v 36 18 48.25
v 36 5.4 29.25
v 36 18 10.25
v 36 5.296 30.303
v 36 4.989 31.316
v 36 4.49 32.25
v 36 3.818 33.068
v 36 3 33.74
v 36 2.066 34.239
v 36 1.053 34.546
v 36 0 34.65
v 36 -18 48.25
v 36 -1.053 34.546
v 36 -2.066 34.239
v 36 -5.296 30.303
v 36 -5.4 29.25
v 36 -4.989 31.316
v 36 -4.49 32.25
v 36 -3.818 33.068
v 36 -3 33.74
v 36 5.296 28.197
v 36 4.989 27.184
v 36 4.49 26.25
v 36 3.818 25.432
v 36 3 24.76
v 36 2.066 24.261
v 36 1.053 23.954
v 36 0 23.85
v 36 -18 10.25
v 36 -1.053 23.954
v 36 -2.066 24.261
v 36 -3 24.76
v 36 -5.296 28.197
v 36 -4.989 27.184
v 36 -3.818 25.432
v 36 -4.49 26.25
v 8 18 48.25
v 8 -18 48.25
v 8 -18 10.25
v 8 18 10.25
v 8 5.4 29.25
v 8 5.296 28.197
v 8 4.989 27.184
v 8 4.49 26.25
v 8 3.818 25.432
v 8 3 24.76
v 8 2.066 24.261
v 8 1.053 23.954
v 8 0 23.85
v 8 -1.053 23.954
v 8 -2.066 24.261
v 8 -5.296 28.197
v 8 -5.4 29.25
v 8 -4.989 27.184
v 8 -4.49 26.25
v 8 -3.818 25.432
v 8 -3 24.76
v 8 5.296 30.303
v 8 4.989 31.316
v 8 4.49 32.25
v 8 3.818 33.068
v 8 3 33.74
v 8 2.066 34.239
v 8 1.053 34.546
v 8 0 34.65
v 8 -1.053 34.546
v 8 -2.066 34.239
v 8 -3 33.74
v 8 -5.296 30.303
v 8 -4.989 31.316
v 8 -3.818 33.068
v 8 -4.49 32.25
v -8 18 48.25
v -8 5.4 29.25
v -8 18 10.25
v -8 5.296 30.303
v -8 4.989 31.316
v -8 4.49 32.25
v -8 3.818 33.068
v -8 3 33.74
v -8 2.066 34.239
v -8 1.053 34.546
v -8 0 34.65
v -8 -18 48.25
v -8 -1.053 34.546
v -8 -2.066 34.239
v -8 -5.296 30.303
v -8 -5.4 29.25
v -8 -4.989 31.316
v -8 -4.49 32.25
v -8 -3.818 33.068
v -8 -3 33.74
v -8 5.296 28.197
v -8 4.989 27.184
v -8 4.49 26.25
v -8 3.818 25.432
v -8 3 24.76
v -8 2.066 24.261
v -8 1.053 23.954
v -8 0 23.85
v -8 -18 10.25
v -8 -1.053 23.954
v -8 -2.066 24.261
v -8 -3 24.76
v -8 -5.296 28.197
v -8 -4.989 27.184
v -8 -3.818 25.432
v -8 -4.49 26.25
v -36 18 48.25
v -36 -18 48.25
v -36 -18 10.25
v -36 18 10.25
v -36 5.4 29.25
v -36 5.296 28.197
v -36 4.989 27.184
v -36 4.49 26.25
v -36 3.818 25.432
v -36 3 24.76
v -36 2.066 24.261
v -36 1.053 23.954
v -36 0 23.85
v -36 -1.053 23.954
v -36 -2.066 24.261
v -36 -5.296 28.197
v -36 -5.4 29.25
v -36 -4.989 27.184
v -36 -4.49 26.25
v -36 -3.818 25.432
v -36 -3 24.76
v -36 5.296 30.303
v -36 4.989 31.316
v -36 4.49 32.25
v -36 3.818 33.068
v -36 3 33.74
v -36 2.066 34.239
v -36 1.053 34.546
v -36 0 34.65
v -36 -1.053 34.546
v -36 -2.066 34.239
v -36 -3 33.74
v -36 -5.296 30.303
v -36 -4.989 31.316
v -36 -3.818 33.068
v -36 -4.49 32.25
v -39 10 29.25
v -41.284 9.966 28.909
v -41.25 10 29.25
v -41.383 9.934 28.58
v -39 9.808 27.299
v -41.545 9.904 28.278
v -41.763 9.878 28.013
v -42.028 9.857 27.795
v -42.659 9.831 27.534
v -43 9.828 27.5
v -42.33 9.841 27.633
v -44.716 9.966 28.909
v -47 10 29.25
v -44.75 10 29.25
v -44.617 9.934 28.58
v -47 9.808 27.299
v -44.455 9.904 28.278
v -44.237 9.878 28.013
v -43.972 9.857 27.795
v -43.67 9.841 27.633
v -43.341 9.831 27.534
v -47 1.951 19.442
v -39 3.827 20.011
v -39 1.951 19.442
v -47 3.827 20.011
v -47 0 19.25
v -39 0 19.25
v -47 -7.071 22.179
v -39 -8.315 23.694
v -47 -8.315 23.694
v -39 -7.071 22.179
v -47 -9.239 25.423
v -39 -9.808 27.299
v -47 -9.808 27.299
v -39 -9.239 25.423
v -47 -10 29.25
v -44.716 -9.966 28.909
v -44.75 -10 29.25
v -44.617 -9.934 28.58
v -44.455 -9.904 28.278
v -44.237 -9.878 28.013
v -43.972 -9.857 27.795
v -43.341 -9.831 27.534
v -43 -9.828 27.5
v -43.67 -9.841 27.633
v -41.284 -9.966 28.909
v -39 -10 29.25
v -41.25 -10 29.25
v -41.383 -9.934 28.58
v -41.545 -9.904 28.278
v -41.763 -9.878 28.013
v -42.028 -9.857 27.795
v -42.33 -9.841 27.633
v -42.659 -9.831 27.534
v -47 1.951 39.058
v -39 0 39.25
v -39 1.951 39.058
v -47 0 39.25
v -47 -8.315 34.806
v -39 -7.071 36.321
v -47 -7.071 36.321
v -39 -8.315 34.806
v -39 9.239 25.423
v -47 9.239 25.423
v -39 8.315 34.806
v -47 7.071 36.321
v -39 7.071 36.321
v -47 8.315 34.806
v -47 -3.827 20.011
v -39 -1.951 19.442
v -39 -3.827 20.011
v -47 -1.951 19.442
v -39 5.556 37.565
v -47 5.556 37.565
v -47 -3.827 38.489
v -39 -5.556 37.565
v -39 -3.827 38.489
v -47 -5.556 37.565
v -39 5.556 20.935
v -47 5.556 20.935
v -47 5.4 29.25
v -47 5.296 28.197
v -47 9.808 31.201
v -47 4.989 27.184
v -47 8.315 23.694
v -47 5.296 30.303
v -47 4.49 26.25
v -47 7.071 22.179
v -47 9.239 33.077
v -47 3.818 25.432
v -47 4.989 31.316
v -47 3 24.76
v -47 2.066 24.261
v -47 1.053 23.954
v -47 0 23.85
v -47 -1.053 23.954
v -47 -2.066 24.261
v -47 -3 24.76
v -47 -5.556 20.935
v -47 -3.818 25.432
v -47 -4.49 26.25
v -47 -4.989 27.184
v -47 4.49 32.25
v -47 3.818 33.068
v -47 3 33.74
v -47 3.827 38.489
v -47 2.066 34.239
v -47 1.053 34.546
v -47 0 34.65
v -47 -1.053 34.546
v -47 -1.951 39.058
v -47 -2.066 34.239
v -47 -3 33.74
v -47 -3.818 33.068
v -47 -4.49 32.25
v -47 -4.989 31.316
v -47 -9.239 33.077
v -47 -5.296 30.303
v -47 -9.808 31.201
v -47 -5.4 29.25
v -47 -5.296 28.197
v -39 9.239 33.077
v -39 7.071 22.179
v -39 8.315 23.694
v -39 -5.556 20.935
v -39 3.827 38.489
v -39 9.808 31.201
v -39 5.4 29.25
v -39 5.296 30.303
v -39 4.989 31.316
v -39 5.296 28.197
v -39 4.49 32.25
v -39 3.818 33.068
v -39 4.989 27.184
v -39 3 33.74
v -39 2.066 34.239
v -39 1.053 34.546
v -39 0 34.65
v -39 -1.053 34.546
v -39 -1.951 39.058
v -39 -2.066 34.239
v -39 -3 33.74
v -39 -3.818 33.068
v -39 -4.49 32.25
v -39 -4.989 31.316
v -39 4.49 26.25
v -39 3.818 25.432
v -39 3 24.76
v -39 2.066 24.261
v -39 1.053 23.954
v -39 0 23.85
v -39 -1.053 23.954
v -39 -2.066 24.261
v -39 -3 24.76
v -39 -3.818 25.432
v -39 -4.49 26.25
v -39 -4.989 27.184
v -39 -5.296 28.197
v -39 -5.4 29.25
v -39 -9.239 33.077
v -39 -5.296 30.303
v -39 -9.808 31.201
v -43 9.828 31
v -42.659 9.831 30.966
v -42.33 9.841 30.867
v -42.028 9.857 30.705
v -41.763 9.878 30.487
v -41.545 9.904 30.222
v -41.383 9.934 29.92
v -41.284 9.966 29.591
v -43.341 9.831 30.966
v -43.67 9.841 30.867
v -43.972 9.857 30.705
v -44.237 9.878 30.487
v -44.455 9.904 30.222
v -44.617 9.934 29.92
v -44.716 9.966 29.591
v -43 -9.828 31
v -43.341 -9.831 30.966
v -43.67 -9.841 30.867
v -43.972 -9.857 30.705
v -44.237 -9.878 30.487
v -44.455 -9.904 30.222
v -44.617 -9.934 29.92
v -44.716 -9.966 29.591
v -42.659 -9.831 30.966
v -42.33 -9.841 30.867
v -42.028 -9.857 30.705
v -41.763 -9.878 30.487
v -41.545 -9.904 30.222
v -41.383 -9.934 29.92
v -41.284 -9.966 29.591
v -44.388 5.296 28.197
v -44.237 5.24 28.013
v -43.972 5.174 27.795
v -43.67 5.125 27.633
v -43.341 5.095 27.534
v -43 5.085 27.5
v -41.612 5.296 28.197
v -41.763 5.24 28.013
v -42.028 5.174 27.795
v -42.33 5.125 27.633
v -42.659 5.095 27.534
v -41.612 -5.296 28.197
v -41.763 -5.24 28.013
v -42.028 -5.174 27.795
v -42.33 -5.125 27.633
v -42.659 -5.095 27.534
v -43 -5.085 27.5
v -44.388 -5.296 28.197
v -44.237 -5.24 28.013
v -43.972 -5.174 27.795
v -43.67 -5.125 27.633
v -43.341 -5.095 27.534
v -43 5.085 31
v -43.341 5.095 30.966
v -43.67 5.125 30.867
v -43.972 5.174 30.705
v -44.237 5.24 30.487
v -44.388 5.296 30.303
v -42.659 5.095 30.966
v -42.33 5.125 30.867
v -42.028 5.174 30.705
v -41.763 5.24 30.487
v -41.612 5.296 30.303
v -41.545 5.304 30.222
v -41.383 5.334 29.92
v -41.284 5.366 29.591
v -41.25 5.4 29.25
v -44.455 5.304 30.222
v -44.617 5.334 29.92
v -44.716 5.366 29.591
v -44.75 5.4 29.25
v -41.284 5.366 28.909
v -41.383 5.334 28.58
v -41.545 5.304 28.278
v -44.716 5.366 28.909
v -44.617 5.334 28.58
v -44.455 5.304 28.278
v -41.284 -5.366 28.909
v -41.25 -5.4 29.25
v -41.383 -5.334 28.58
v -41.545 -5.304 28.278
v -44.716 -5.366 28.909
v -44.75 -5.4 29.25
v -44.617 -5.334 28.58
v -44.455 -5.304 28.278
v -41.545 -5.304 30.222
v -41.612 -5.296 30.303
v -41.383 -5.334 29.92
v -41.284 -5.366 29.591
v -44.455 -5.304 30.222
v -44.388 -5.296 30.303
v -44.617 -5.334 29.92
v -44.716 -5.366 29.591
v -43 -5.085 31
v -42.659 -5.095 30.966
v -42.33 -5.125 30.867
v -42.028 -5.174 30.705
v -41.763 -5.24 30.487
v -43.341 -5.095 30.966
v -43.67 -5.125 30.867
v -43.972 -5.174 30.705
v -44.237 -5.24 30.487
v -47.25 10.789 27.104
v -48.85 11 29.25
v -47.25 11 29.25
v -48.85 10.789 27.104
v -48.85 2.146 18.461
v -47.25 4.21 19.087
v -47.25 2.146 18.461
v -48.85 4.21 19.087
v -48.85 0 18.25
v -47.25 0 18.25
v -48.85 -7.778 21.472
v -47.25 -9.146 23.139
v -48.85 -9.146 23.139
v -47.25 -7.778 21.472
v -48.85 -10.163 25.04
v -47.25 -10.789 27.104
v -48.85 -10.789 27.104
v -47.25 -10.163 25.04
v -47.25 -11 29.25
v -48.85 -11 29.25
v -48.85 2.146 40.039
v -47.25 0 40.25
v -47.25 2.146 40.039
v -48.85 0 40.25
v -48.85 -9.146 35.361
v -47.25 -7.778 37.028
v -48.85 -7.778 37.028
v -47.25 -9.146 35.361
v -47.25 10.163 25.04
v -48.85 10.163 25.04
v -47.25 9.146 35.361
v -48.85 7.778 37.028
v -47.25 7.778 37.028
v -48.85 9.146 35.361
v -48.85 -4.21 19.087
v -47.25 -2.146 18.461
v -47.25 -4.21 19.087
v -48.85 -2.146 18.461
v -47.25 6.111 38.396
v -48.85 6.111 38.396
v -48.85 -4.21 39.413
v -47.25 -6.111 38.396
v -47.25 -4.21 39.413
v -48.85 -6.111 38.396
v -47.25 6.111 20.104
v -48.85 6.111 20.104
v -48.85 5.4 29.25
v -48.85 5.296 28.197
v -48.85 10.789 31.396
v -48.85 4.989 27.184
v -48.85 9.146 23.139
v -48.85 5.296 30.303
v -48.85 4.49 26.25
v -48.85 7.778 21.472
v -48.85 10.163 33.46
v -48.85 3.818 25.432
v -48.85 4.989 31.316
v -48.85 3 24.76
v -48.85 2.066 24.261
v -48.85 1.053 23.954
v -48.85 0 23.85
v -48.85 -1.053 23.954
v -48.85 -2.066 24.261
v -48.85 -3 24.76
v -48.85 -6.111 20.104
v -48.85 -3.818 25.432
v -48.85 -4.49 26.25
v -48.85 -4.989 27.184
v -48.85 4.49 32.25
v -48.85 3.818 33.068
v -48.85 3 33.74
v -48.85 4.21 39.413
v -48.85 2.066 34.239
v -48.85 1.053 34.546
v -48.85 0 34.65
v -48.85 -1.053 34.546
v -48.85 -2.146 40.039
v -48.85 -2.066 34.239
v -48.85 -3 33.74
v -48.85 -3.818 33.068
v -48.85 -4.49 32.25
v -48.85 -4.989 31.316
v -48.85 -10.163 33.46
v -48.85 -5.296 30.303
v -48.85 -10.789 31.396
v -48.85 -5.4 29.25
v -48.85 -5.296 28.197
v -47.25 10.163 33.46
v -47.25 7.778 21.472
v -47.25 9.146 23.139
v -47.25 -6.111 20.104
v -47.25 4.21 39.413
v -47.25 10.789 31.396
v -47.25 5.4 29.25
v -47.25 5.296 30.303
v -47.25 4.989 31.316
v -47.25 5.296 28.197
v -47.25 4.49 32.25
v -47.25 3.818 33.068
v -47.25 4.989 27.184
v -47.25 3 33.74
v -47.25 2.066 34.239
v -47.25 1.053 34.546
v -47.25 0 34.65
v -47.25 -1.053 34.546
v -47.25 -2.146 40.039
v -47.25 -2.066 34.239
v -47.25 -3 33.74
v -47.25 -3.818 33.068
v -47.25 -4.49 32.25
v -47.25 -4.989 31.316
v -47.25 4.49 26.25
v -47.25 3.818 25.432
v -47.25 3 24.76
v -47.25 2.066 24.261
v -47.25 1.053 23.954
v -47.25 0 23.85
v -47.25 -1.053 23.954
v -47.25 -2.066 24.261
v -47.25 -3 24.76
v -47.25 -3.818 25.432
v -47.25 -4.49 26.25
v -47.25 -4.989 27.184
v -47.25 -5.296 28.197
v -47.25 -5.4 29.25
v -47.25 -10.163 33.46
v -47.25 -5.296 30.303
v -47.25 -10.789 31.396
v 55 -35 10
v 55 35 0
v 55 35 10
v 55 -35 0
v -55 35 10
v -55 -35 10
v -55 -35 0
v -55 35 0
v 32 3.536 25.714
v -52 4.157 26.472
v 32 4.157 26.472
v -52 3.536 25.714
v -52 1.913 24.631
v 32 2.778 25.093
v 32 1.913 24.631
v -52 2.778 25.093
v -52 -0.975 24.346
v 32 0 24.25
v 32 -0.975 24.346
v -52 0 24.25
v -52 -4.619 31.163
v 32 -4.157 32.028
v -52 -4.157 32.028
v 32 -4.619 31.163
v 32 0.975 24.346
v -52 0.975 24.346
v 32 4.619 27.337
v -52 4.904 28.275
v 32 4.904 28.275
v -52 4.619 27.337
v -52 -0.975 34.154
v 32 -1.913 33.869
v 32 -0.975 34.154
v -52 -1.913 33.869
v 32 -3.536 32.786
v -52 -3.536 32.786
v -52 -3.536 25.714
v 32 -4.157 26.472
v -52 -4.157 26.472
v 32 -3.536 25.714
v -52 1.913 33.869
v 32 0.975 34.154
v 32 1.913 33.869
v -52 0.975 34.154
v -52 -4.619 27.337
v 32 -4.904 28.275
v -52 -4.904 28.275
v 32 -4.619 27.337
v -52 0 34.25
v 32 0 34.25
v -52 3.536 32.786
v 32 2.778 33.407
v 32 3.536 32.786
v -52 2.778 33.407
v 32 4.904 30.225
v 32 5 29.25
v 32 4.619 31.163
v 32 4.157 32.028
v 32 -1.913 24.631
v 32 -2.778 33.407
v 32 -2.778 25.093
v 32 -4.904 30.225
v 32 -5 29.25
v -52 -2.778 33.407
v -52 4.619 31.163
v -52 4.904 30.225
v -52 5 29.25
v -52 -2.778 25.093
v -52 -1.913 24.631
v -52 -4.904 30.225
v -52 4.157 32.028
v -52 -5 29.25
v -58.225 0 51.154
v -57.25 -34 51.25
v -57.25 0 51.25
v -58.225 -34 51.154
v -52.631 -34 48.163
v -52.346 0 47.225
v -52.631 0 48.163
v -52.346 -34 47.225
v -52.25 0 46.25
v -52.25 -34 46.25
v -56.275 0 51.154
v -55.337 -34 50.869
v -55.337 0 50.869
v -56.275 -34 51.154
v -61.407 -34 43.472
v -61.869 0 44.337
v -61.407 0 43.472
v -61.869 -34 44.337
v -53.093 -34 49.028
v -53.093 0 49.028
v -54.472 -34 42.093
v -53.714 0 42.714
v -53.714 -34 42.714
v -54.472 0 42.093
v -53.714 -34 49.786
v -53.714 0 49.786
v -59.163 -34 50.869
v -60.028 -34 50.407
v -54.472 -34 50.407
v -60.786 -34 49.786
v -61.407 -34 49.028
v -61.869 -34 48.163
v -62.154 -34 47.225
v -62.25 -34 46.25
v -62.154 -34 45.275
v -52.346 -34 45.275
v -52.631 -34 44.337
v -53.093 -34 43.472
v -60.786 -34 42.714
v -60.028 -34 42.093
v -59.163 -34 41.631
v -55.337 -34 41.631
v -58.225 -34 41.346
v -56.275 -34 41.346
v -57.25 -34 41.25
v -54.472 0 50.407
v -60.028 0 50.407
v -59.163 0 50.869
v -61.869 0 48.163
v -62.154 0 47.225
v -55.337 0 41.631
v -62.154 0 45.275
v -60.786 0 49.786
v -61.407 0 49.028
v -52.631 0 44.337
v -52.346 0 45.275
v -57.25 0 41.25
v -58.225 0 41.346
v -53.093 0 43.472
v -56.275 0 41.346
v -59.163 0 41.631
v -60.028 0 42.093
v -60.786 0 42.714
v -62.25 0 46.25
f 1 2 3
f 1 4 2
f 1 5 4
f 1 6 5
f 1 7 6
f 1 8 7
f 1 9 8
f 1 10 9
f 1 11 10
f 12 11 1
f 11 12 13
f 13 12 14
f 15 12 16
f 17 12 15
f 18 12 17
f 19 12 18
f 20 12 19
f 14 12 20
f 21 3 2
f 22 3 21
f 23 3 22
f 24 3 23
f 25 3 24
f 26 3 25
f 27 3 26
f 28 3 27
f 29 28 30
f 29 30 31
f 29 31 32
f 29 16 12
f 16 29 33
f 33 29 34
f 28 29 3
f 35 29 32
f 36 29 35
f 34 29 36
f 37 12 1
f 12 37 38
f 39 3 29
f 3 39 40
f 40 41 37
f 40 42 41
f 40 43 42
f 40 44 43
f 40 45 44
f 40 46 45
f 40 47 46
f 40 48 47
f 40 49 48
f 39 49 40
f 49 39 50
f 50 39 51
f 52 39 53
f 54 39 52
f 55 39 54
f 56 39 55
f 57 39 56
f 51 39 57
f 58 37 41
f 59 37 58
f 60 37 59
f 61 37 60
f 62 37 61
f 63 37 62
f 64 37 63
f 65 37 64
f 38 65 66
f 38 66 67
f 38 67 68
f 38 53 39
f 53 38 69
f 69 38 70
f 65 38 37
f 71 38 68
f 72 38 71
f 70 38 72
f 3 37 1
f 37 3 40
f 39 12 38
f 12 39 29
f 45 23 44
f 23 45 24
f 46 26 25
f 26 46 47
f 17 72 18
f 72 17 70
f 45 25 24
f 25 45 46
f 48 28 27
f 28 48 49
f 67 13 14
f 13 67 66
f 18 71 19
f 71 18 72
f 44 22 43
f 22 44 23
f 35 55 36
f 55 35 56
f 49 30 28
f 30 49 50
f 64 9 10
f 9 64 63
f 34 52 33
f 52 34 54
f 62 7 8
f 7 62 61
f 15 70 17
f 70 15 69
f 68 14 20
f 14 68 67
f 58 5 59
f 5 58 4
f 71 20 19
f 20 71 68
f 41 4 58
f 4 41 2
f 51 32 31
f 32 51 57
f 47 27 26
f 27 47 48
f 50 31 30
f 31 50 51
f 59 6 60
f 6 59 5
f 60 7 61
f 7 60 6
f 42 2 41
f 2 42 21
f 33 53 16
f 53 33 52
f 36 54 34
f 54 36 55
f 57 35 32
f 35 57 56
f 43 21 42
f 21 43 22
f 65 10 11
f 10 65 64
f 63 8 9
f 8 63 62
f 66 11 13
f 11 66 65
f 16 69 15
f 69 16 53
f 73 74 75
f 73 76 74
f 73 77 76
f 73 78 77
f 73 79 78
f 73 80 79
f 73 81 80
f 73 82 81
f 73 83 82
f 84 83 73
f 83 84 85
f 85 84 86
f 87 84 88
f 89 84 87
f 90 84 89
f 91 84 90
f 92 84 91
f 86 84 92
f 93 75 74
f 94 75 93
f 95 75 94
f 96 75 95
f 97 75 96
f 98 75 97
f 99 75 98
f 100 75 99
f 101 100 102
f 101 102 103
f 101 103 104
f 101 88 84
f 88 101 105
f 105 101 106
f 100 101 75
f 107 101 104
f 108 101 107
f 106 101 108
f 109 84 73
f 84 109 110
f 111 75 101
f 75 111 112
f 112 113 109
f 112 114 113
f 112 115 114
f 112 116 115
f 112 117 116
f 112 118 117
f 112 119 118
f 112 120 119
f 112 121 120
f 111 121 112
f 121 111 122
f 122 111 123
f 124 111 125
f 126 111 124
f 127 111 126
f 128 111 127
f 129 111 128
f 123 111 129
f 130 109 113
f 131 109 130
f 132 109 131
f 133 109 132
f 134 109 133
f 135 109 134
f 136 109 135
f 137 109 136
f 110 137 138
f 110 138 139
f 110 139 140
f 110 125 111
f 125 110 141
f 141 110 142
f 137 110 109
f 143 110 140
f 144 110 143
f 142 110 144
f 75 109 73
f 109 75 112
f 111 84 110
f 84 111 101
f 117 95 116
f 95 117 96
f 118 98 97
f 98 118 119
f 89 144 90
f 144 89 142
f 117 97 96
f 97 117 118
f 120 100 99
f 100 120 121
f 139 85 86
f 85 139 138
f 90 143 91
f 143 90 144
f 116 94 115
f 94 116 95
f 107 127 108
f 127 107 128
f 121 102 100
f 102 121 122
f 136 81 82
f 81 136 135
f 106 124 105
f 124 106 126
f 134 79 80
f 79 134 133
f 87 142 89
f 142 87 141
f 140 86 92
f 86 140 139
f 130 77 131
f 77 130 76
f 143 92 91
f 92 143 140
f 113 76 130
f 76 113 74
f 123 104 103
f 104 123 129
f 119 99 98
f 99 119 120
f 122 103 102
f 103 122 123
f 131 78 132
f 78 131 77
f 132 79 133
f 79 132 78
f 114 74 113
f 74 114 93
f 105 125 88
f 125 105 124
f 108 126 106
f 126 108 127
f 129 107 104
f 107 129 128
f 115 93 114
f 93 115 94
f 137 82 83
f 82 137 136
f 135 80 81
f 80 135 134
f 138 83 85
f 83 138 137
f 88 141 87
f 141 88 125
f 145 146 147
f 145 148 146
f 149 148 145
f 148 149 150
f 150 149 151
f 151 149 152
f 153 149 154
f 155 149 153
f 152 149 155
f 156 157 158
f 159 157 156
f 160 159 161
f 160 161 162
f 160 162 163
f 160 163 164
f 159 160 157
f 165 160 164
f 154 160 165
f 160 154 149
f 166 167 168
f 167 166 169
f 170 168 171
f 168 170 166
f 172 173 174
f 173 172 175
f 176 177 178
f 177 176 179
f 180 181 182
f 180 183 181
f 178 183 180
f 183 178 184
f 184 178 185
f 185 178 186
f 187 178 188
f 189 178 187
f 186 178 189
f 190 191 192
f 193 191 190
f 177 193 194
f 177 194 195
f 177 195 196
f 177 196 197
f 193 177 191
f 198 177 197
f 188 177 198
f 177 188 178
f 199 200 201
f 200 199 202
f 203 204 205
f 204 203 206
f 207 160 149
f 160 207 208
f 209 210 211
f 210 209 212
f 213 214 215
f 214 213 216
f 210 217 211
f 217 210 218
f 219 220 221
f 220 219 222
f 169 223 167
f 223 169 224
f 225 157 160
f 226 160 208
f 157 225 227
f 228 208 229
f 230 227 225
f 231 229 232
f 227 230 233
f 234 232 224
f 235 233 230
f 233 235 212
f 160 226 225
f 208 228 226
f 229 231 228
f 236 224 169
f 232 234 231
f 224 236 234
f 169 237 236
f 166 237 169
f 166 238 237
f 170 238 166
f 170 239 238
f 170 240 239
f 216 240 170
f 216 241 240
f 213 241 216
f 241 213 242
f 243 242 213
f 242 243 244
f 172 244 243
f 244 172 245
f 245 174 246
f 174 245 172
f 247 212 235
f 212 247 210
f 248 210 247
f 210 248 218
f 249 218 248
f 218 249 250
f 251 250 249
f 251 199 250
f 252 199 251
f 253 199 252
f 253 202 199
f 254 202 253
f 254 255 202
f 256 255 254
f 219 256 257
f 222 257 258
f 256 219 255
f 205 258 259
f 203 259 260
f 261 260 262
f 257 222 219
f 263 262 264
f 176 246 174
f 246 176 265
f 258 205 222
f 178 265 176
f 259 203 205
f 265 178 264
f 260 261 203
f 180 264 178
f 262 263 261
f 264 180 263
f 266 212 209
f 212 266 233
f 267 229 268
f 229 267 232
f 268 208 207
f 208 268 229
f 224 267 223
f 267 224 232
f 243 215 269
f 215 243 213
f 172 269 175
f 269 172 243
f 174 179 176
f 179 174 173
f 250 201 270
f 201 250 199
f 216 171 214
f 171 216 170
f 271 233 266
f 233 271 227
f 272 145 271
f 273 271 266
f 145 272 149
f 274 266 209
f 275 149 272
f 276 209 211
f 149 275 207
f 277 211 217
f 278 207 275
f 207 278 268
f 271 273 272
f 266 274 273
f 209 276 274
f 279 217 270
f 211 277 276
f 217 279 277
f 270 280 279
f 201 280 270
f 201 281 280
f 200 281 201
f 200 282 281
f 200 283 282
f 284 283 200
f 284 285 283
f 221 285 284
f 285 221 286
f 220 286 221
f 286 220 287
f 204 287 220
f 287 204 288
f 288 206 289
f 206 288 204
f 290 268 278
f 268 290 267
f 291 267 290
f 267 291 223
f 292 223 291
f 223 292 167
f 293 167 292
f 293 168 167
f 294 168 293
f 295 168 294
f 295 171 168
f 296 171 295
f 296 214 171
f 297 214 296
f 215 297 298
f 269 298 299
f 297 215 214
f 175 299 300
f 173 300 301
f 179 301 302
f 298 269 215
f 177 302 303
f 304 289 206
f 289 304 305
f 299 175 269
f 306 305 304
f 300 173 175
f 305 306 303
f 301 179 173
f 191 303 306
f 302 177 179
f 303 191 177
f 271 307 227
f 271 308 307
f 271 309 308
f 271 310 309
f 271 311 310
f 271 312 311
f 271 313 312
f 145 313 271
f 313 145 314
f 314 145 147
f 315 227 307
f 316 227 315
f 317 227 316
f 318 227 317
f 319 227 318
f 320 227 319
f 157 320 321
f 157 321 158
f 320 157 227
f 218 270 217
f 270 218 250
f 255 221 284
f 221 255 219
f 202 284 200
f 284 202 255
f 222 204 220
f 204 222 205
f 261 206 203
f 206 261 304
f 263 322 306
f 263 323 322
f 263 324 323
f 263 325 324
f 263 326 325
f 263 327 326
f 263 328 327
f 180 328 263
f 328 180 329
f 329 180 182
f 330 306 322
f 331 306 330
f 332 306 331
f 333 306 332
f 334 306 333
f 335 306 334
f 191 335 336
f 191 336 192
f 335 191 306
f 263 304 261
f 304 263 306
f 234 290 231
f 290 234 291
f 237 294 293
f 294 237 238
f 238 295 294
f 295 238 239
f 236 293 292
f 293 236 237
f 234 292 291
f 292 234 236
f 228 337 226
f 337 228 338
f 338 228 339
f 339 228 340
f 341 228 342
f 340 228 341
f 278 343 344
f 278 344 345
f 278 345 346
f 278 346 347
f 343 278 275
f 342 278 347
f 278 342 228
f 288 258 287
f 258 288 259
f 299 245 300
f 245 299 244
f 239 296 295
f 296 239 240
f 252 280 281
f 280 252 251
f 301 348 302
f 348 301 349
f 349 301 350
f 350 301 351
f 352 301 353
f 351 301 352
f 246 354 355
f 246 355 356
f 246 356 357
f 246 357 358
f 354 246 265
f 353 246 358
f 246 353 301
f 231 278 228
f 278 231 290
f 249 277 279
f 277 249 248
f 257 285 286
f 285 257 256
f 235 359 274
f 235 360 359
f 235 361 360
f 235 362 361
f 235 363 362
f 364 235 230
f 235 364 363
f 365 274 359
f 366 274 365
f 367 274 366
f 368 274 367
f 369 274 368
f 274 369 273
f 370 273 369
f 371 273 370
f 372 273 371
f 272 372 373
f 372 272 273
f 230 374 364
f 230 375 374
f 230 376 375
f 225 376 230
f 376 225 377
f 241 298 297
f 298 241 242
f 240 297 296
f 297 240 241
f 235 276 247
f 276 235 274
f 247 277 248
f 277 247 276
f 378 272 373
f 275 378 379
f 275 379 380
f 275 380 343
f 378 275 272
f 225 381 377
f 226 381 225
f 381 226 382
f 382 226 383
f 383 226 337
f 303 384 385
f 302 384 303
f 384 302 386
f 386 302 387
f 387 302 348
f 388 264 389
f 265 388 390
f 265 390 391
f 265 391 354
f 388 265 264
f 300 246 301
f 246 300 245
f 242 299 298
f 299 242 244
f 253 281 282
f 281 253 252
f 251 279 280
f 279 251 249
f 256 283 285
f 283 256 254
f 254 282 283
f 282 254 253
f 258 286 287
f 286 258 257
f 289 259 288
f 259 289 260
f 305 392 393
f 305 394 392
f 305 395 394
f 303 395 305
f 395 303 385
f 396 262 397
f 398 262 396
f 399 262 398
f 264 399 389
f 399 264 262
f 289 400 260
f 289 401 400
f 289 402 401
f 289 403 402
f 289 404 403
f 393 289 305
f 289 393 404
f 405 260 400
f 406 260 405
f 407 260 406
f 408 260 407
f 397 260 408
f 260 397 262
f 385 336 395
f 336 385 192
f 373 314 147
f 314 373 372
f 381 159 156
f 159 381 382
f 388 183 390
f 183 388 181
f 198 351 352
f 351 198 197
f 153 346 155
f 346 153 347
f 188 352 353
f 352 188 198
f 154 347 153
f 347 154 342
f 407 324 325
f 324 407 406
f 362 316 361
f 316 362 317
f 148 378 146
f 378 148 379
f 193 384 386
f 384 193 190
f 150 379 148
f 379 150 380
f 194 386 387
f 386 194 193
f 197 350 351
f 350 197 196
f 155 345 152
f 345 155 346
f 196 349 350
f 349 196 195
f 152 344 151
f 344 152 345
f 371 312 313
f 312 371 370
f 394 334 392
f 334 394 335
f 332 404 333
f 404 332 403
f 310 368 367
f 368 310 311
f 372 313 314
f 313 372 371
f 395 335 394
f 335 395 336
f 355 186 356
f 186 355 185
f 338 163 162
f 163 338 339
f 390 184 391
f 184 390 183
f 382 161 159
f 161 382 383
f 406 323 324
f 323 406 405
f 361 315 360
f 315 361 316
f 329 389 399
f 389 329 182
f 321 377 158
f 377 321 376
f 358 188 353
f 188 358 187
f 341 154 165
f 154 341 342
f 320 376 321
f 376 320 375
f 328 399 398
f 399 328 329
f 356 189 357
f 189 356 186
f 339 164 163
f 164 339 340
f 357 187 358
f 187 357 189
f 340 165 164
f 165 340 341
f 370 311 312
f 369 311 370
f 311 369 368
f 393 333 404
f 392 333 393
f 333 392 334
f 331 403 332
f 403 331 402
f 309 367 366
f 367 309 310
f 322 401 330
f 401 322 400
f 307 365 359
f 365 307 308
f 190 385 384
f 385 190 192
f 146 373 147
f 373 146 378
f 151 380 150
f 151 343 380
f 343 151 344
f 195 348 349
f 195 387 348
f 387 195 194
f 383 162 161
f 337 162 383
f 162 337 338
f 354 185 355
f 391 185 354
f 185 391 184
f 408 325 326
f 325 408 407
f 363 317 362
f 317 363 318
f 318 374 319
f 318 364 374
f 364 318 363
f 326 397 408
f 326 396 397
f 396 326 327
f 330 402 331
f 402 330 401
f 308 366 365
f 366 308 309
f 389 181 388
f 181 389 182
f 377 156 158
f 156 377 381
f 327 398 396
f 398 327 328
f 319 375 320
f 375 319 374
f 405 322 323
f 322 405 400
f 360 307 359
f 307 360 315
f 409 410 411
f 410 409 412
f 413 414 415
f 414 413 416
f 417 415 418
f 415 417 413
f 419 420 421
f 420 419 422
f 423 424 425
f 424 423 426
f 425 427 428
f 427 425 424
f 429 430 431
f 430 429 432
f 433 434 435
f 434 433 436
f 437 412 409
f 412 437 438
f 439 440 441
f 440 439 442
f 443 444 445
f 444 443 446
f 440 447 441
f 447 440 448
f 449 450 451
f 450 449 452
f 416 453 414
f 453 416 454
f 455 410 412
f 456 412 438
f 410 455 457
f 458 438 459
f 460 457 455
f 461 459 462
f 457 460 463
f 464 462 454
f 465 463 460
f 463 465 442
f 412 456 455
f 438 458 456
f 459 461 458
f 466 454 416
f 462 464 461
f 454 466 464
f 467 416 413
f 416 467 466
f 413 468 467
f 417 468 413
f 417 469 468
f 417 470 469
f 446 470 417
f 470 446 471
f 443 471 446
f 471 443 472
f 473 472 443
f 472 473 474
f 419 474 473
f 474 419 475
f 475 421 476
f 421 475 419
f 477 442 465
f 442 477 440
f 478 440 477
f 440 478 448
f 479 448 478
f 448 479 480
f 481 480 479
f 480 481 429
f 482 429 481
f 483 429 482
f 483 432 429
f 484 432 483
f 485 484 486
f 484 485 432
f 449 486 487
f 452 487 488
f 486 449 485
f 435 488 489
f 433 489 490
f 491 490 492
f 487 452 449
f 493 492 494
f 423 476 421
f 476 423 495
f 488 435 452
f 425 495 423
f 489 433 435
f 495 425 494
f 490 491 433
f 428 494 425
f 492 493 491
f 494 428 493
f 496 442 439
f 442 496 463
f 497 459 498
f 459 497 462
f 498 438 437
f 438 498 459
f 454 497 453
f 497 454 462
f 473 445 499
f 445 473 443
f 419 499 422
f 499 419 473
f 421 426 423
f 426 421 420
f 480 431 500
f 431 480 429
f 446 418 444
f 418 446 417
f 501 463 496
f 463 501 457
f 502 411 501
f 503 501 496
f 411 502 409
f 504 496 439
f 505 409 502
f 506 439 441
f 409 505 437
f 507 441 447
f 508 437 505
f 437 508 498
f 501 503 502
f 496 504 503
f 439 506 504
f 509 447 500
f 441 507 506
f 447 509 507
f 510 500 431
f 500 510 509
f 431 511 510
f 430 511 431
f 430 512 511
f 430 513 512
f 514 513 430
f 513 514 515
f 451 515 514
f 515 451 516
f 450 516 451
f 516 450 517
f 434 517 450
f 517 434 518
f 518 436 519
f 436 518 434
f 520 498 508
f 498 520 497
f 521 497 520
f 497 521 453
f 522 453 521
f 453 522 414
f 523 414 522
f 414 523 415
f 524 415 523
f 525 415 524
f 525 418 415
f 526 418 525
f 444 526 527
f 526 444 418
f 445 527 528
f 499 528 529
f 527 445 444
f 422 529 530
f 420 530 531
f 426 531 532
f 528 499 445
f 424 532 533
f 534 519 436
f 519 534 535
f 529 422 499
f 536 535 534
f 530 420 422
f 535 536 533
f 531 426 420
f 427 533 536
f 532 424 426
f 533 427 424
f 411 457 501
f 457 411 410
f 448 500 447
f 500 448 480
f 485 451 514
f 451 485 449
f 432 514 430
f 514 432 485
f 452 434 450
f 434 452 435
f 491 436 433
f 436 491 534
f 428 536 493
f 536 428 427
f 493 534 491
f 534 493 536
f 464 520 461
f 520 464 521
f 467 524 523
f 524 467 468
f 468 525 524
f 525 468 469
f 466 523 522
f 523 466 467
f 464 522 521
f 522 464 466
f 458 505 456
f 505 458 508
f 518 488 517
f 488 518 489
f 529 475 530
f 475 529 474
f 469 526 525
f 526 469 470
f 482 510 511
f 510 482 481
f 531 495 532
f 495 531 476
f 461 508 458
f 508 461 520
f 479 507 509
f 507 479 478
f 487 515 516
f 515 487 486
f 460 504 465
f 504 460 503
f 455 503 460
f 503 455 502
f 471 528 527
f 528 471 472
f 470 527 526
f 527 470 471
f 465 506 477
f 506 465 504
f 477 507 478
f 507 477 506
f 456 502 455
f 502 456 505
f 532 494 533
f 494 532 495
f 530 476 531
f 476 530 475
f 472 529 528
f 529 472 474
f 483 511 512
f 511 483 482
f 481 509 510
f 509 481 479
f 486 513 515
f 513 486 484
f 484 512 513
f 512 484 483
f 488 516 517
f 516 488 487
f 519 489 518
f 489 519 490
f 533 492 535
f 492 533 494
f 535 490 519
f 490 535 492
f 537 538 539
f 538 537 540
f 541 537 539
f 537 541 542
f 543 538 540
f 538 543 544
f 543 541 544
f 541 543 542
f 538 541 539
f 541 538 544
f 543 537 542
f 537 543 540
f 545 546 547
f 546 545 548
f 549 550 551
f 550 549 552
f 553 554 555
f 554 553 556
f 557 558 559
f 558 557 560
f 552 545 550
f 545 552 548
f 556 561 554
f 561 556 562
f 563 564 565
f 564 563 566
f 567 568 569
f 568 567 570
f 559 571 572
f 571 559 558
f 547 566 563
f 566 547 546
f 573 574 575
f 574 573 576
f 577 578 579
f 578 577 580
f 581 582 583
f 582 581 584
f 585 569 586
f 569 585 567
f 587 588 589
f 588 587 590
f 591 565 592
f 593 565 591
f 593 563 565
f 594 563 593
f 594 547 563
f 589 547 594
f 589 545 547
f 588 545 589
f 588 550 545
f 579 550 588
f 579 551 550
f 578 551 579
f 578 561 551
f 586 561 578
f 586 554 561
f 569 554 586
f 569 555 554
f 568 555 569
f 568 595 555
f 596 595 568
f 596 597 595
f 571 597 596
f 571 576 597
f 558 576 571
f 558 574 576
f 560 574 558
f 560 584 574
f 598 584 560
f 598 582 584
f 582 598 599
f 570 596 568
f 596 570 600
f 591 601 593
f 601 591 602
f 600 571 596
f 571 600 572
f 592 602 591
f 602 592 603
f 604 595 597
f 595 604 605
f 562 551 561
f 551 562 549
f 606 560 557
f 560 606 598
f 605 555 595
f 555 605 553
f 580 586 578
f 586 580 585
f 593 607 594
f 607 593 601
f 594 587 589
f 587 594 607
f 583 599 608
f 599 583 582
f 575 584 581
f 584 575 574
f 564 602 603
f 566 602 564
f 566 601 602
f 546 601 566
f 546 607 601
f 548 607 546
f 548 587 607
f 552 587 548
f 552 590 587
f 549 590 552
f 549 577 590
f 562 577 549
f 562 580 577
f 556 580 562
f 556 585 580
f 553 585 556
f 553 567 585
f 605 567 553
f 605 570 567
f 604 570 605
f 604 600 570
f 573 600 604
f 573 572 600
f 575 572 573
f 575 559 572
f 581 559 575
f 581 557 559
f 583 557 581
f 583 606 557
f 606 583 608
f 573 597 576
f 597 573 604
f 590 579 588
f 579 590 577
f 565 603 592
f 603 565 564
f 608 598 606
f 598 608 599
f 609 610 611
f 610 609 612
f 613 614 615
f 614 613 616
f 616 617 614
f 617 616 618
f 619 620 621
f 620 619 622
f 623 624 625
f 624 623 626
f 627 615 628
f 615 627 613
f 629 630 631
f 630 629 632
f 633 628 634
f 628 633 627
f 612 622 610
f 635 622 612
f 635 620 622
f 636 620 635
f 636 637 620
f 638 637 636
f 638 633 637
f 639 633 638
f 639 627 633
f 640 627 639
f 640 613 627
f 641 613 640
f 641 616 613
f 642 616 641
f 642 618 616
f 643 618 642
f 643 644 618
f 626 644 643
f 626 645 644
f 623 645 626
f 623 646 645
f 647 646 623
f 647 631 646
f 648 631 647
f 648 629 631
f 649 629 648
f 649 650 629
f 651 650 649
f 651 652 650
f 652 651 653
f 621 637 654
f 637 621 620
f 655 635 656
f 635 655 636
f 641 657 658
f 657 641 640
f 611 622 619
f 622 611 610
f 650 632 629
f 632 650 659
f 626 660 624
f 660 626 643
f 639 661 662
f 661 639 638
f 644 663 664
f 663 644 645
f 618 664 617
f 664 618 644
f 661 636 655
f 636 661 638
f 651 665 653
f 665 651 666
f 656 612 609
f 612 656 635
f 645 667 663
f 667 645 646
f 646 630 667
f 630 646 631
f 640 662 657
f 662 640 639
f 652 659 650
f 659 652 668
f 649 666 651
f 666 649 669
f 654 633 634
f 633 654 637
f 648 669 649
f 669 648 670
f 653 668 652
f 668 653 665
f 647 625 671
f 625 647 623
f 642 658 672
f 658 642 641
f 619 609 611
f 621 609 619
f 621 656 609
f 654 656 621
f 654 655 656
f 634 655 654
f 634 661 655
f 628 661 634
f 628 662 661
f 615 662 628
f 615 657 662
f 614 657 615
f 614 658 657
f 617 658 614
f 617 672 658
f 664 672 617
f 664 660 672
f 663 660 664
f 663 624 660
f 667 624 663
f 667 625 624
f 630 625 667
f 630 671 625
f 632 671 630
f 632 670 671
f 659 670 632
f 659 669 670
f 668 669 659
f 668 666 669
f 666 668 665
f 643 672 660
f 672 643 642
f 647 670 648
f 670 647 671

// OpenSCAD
$fn = 32;

// ------------------------------------------------------------------------
// Machine vise: screw d10, jaws 28 x 38 mm
// Every part is its own module, assembly() places every instance.
// ------------------------------------------------------------------------

// --- part 1 ---
module vise_bed() {
  difference() {
    translate([-55, -35, 0]) cube([110, 70, 10]);
  }
}

// --- part 2 ---
module vise_jaw() {
  difference() {
    translate([-14, -18, 0]) cube([28, 36, 38]);
    translate([0, 0, 19]) rotate([0, 90, 0]) cylinder(h = 30, d = 10.8, center = true);
  }
}

// --- part 3 ---
module vise_screw() {
  translate([0, 0, -42]) cylinder(h = 84, d = 10);
}

// --- part 4 ---
module screw_collar() {
  difference() {
    cylinder(h = 8, d = 20);
    translate([0, 0, -1]) cylinder(h = 10, d = 10.8);
    translate([0, 0, 4]) rotate([90, 0, 0]) cylinder(h = 22, d = 3.5, center = true);
  }
}

// --- part 5 ---
module screw_washer() {
  difference() {
      translate([0, 0, 0]) cylinder(h = 1.6, d = 22);
      translate([0, 0, -1]) cylinder(h = 3.6, d = 10.8);
    }
}

// --- part 6 ---
module vise_handle() {
  cylinder(h = 34, d = 10);
}

// --- assembly ---
module assembly() {
  color([0.80, 0.24, 0.20]) translate([0, 0, 0]) rotate([0, 0, 0]) vise_bed();
  color([0.20, 0.45, 0.75]) translate([22, 0, 10.25]) rotate([0, 0, 0]) vise_jaw();
  color([0.25, 0.62, 0.32]) translate([-22, 0, 10.25]) rotate([0, 0, 0]) vise_jaw();
  color([0.92, 0.70, 0.18]) translate([-10, 0, 29.25]) rotate([0, 90, 0]) vise_screw();
  color([0.58, 0.35, 0.70]) translate([-47, 0, 29.25]) rotate([0, 90, 0]) screw_collar();
  color([0.16, 0.66, 0.66]) translate([-48.85, 0, 29.25]) rotate([0, 90, 0]) screw_washer();
  color([0.85, 0.48, 0.18]) translate([-57.25, 0, 46.25]) rotate([90, 0, 0]) vise_handle();
}

assembly();
